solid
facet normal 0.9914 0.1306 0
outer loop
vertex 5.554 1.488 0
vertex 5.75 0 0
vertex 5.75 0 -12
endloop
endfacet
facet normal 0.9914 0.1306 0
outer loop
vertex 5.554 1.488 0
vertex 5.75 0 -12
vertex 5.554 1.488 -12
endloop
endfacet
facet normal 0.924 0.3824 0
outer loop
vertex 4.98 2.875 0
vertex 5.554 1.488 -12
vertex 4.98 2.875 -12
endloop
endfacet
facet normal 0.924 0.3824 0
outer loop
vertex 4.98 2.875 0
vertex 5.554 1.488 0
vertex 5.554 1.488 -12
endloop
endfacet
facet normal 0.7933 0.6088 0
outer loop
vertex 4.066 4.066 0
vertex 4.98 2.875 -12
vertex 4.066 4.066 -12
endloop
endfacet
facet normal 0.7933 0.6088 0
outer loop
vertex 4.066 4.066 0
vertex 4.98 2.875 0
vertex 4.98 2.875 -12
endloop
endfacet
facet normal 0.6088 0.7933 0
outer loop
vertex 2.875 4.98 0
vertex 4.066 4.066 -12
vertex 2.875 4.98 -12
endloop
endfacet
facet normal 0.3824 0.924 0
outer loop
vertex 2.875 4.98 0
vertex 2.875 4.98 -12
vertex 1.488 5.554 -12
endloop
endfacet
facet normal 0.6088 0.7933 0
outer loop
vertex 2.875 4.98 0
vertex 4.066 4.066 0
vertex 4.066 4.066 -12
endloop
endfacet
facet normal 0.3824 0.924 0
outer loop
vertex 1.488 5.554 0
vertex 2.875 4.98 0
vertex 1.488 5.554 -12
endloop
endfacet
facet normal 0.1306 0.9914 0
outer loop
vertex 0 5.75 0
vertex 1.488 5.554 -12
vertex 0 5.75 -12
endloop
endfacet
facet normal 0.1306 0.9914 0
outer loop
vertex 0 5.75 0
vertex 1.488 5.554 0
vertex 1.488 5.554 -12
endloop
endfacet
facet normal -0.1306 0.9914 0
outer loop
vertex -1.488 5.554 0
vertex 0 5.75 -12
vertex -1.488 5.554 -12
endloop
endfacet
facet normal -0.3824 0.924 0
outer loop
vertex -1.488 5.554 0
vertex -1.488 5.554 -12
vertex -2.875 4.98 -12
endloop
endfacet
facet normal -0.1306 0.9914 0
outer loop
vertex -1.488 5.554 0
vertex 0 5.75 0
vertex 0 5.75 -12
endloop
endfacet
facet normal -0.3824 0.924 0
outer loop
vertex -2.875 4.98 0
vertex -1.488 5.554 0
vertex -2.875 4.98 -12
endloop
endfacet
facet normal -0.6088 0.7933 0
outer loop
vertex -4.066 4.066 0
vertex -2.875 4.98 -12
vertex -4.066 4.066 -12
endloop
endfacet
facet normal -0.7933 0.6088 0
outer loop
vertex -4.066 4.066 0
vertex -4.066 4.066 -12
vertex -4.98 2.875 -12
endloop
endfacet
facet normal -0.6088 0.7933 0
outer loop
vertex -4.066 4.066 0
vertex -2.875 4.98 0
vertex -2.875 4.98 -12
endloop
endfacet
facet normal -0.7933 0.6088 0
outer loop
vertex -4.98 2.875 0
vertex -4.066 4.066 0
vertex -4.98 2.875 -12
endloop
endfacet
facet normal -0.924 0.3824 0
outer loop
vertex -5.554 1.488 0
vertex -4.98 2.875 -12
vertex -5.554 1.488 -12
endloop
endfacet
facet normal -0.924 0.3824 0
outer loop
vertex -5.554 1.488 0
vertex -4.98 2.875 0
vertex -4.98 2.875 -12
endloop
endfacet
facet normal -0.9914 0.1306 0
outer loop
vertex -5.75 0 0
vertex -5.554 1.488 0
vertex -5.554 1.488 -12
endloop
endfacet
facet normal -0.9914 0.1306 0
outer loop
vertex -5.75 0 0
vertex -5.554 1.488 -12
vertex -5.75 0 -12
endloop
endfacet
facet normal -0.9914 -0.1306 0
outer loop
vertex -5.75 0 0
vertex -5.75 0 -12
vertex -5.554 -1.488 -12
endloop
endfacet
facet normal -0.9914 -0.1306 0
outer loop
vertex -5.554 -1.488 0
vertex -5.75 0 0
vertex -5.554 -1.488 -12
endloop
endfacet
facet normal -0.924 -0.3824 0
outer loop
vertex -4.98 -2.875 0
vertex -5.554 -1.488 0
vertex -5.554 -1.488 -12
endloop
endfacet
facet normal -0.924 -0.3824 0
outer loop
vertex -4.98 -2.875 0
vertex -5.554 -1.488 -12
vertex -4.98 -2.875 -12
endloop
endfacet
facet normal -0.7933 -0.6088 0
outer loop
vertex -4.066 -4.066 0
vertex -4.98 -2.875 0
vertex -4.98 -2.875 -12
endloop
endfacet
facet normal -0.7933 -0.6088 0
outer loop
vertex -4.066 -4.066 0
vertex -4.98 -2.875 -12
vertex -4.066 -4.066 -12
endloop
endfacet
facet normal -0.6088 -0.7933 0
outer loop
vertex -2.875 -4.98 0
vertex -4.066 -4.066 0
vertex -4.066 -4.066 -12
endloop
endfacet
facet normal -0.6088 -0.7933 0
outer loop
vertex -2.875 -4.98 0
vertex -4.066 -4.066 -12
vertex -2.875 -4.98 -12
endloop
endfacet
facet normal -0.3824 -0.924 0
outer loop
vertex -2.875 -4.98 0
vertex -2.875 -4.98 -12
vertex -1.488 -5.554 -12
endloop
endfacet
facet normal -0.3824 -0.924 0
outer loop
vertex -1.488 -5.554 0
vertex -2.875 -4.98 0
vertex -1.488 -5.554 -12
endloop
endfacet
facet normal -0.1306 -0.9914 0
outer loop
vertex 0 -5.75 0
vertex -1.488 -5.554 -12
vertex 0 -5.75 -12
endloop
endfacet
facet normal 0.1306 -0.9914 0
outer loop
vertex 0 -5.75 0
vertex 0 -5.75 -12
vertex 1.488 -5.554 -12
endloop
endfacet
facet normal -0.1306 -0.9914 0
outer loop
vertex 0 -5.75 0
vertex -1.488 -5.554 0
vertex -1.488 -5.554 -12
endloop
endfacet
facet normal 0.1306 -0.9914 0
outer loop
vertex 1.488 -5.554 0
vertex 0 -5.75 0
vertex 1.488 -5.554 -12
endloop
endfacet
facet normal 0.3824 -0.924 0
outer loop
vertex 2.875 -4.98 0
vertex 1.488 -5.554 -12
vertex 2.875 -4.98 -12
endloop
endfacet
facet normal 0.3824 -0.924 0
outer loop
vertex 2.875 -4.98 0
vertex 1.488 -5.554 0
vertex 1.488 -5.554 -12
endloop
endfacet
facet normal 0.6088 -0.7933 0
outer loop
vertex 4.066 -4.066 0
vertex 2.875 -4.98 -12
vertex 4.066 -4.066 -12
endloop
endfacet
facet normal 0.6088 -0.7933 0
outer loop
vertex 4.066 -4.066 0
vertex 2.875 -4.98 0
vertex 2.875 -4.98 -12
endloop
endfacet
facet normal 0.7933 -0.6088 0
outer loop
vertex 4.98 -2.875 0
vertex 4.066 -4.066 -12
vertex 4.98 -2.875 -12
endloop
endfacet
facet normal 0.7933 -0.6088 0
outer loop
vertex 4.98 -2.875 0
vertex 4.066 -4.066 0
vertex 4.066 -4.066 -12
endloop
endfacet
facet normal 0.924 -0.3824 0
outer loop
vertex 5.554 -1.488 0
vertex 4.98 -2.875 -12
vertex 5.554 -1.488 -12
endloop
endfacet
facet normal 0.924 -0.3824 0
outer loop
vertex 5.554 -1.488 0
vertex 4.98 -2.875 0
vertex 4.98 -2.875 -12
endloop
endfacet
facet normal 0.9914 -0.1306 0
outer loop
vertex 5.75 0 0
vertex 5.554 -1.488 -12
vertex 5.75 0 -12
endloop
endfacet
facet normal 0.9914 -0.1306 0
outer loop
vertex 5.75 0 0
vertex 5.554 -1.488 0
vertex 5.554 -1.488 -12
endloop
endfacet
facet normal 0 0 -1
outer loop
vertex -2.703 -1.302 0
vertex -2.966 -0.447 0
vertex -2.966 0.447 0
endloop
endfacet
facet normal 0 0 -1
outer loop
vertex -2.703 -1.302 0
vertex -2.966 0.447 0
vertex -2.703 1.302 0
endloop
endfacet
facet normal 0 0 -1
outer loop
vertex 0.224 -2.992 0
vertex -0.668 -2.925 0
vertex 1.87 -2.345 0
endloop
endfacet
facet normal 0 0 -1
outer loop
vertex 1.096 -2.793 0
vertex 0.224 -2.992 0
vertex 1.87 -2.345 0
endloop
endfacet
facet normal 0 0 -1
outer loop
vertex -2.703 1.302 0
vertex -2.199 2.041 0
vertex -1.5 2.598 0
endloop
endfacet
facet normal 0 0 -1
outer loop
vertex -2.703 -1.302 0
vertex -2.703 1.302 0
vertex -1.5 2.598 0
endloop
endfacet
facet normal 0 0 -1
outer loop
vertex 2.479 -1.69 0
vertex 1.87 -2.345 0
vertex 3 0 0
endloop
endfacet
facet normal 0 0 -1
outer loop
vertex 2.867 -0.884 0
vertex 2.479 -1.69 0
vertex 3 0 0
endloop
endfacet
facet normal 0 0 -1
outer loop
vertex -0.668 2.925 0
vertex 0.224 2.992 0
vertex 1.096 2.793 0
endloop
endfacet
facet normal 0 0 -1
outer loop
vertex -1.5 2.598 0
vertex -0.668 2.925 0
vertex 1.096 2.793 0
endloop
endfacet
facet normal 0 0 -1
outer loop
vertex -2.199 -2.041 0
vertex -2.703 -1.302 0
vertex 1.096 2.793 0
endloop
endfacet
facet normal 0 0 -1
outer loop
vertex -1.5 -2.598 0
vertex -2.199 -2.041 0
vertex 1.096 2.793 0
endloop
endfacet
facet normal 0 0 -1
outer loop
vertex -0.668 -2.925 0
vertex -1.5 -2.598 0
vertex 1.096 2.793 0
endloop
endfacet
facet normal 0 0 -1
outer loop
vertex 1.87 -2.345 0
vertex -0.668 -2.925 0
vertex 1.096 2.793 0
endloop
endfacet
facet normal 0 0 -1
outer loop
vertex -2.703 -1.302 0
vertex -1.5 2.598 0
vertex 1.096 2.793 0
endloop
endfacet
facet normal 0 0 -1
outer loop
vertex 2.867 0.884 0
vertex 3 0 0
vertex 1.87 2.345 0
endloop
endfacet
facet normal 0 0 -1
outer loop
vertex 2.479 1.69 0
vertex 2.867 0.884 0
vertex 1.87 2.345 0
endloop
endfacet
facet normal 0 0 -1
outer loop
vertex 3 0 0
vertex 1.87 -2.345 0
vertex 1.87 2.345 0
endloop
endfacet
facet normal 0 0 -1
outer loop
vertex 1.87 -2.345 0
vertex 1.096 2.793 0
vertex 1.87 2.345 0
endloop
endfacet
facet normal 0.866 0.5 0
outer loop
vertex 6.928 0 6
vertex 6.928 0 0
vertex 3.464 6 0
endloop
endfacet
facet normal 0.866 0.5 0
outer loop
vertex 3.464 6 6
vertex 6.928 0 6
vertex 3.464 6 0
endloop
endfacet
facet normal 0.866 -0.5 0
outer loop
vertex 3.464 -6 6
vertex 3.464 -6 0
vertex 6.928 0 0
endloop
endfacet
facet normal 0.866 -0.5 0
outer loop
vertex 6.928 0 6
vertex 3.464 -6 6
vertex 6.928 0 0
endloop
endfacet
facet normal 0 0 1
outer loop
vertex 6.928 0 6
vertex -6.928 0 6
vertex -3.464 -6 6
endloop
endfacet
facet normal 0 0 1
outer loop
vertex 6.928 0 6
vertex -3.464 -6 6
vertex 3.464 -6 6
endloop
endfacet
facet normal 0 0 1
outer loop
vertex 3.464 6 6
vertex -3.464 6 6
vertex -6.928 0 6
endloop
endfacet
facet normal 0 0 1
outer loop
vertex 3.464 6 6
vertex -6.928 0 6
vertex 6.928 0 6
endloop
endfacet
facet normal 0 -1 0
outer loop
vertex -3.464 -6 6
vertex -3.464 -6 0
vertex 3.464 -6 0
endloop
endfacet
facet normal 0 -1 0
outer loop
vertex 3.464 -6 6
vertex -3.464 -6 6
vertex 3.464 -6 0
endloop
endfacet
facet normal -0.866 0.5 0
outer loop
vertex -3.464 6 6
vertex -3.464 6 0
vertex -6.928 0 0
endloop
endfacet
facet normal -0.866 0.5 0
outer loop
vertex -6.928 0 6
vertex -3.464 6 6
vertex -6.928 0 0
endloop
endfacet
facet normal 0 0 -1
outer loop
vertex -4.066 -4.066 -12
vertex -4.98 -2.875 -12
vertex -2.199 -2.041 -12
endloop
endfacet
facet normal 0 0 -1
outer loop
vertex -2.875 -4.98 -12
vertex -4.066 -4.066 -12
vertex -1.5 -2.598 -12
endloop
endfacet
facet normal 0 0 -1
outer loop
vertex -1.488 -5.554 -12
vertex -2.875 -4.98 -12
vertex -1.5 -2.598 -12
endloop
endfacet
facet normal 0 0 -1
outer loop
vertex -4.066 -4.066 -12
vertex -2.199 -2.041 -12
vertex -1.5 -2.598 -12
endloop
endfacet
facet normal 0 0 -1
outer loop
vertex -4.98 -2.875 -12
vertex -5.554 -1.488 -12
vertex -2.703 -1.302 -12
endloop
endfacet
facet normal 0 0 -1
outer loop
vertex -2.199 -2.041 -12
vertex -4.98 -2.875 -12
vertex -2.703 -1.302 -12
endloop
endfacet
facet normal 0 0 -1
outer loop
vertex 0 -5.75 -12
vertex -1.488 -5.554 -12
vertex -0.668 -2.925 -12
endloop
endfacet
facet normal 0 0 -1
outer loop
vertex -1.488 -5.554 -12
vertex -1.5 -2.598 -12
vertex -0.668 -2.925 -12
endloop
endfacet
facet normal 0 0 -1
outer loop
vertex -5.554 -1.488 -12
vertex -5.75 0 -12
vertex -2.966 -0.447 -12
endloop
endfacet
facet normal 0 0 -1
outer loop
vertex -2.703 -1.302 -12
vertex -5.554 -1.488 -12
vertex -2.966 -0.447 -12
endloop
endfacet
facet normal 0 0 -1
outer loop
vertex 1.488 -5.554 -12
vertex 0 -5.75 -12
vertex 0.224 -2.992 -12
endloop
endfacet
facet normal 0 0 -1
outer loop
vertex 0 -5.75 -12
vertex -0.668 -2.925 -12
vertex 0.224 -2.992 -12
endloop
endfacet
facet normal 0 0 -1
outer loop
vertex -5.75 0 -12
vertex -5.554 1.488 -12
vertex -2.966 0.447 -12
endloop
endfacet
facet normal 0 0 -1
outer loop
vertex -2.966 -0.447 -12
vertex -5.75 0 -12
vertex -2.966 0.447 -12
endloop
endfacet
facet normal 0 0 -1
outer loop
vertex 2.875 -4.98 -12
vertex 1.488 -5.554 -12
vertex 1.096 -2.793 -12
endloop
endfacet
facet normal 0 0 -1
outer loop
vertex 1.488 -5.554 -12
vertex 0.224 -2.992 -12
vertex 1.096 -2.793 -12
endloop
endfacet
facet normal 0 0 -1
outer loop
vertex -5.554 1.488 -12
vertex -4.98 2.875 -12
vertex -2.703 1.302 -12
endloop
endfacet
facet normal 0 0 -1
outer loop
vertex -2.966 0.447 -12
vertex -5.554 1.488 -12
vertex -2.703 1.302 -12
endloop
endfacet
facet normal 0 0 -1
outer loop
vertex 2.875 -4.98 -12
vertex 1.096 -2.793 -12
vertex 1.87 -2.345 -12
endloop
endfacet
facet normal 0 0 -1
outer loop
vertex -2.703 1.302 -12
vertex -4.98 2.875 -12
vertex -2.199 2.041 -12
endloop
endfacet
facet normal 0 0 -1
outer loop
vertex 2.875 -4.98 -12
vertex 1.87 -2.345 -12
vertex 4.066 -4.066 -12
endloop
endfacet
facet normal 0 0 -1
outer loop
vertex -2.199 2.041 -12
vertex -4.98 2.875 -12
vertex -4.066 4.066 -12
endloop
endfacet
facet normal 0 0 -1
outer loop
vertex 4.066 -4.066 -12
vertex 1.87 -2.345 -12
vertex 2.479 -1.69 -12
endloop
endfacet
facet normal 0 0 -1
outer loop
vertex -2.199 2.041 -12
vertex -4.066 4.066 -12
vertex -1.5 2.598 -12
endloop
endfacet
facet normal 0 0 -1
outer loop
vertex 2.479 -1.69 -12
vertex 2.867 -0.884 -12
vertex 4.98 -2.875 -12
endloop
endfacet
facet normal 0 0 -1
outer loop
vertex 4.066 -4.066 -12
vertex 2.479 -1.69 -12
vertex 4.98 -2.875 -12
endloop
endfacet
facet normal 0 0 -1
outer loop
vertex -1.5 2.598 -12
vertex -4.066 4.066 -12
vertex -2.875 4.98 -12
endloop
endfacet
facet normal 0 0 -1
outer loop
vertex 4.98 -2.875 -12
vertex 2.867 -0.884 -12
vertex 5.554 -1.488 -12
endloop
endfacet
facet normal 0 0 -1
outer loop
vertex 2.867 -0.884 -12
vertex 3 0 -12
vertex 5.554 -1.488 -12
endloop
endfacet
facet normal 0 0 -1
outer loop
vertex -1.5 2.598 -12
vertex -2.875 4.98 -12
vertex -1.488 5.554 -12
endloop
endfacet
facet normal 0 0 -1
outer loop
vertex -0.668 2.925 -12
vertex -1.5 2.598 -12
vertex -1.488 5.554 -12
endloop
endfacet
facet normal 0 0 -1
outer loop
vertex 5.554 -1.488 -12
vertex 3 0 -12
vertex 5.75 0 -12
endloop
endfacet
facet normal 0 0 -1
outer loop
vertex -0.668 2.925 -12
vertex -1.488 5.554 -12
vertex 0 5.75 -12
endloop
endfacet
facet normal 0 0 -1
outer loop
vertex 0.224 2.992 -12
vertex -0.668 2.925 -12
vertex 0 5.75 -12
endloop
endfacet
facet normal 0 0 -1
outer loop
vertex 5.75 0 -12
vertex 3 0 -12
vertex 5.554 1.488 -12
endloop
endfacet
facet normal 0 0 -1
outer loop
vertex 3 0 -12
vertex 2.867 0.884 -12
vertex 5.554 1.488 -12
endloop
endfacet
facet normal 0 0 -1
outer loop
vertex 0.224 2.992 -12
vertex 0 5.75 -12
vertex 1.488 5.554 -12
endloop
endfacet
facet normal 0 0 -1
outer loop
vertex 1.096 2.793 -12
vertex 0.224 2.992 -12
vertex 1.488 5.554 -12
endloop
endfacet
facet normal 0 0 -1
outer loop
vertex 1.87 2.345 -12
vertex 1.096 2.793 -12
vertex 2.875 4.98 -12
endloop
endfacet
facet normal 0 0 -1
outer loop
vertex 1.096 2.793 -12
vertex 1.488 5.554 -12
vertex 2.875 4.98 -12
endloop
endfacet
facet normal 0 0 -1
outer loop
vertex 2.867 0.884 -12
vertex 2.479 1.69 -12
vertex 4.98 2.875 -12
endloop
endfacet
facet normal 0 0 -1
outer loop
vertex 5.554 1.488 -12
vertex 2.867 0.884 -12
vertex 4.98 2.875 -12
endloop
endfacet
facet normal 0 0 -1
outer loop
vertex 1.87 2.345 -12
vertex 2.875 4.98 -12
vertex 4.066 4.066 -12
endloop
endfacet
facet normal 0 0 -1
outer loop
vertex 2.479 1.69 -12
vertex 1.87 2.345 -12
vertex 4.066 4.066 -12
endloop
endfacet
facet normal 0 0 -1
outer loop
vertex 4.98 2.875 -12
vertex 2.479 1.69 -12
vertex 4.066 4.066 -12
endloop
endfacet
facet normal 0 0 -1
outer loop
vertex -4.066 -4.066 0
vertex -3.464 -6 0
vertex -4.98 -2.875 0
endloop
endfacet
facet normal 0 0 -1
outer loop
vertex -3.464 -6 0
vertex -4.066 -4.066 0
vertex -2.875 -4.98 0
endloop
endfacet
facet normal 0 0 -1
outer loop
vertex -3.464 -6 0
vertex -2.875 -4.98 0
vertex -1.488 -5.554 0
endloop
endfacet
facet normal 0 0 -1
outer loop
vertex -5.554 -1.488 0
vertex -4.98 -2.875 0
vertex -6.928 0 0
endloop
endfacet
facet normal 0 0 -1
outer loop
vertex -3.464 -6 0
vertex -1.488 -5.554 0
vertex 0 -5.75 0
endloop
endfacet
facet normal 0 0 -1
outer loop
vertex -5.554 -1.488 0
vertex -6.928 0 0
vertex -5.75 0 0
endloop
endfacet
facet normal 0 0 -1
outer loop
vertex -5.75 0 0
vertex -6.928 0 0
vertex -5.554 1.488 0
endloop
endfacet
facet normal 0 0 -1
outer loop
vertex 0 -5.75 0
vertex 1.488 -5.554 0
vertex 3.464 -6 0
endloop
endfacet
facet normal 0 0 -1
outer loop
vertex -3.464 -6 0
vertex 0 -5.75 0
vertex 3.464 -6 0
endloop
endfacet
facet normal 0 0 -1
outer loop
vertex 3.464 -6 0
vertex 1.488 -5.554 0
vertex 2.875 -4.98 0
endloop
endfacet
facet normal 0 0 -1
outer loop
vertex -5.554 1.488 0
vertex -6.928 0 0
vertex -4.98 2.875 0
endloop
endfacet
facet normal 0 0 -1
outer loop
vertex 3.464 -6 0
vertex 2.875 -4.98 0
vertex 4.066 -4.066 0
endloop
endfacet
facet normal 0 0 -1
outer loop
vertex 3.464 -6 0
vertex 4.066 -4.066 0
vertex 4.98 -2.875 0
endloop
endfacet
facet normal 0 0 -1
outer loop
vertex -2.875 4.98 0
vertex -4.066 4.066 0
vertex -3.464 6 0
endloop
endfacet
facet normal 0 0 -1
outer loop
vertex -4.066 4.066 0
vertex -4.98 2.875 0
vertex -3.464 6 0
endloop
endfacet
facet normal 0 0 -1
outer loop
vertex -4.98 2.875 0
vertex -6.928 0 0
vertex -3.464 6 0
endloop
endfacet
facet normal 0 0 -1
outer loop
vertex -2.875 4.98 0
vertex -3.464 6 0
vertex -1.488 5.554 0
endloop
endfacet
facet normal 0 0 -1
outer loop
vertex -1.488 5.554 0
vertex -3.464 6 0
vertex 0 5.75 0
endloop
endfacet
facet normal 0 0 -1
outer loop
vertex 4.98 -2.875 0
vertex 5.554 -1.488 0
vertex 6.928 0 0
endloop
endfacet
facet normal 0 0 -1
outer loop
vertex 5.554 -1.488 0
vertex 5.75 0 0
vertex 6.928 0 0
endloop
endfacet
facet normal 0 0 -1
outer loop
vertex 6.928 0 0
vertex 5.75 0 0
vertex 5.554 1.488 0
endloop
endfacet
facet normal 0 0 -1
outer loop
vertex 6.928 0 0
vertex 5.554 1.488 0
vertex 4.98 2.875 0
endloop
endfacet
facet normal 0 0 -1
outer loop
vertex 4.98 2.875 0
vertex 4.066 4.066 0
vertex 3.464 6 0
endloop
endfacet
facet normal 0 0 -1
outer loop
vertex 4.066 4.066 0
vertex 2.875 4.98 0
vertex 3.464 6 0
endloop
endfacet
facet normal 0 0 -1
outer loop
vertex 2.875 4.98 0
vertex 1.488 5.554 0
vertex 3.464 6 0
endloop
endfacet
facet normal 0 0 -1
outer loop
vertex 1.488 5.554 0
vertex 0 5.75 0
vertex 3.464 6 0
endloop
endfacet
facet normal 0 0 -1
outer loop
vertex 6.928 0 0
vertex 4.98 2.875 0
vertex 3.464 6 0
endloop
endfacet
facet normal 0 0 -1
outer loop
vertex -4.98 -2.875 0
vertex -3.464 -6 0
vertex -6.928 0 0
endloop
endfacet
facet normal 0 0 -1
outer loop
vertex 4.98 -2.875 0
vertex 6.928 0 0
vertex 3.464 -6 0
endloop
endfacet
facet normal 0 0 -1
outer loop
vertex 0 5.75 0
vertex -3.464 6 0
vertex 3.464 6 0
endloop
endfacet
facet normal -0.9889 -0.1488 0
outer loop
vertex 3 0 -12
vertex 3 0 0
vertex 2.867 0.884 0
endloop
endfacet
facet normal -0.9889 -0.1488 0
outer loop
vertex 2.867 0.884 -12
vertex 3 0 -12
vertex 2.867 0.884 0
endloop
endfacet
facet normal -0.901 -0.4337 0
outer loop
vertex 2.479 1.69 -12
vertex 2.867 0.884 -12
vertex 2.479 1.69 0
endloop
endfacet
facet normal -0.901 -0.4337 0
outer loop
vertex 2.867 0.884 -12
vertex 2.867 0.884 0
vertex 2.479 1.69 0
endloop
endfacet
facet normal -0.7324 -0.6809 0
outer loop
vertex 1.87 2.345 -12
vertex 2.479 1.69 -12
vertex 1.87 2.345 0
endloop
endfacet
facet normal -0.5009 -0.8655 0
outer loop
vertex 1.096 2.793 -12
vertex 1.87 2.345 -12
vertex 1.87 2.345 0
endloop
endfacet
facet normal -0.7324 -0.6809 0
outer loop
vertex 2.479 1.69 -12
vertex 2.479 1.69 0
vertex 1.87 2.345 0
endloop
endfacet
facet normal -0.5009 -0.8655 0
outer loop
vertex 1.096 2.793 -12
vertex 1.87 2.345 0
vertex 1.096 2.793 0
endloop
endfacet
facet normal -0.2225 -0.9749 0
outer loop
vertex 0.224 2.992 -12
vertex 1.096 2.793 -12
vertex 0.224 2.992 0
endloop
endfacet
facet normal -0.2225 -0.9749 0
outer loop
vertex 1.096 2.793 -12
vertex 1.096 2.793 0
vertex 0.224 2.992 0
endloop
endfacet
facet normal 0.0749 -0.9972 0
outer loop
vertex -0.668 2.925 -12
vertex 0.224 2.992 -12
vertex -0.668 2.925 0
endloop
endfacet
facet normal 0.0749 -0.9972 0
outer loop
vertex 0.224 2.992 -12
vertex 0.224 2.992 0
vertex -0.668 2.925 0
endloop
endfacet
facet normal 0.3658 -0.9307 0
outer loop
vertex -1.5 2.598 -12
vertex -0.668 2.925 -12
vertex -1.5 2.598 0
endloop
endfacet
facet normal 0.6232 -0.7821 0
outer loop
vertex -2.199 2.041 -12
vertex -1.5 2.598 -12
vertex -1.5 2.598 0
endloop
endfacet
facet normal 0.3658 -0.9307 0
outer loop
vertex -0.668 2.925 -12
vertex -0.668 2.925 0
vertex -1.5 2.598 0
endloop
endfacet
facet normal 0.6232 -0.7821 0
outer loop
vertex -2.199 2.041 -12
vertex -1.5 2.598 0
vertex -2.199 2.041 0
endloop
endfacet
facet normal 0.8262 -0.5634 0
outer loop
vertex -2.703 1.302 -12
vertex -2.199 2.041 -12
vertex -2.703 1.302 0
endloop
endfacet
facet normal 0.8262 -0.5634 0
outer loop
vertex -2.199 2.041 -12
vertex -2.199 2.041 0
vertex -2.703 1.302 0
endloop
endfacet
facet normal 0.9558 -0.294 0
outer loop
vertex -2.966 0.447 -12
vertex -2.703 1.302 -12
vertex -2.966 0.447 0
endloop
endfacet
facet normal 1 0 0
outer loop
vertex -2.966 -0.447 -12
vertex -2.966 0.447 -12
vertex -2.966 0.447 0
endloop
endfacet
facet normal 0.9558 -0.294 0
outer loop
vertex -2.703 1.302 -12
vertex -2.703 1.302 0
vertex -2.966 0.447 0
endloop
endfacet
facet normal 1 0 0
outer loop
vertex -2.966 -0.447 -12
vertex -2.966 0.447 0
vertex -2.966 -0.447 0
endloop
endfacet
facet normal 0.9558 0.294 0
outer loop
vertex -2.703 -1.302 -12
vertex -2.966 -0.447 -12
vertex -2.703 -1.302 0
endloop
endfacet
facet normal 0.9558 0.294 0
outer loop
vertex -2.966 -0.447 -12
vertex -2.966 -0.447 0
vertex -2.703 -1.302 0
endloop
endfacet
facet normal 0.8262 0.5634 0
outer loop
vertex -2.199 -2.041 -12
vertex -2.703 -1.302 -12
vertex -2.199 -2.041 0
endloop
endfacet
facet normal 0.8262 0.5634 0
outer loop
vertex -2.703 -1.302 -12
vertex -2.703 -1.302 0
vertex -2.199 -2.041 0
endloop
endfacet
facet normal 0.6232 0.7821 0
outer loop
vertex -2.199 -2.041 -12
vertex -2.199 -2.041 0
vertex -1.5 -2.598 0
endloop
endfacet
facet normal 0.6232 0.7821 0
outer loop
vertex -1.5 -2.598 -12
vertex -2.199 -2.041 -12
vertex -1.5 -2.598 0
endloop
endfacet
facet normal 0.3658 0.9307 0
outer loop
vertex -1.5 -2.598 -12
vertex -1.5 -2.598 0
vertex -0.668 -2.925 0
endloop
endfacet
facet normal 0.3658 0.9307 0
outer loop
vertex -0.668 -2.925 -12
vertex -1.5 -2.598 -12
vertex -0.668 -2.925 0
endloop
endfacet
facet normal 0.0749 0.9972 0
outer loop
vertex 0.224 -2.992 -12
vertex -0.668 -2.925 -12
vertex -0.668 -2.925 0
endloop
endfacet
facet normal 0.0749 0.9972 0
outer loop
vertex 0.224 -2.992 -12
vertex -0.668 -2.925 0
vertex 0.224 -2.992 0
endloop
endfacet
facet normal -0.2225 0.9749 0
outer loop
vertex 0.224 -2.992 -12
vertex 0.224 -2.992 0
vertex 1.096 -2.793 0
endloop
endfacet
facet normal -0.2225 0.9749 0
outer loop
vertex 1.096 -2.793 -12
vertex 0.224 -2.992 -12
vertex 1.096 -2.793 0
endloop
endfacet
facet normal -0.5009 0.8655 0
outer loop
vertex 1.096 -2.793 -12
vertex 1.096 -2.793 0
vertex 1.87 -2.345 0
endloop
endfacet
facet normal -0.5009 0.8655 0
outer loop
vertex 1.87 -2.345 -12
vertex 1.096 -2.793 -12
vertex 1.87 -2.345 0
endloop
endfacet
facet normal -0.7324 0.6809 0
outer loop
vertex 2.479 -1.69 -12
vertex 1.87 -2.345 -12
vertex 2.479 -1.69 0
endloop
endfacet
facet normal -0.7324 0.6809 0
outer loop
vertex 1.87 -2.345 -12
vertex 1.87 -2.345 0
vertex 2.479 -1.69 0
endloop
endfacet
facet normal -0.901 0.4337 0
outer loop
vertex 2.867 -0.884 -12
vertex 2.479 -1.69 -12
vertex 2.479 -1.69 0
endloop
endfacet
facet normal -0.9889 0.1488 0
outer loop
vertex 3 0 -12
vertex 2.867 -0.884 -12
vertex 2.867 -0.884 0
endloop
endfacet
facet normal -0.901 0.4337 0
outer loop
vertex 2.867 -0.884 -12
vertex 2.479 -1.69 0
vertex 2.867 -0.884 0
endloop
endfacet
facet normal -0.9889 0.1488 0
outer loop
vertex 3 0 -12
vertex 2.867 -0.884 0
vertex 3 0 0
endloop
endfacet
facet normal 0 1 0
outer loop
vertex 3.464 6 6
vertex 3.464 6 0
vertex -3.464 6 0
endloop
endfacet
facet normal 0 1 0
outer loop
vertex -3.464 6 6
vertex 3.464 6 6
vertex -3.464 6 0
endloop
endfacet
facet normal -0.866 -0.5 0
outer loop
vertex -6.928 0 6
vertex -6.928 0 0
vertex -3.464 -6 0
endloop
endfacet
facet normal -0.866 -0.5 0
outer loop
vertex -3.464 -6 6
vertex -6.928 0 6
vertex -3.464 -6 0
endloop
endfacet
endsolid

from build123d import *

# Parameters (mm, degrees)
BOSS_EXTRUDE1_DEPTH = 6
SKETCH1_3_R         = 5.75
SKETCH1_3_R_2       = 3
BOSS_EXTRUDE2_DEPTH = 12


with BuildPart() as part:
    # Sketch1 → Boss-Extrude1 (new body)
    with BuildSketch(Plane.XY):
        Polygon((-6.92820323, 0), (-3.464101615, -6), (3.464101615, -6), (6.92820323, 0), (3.464101615, 6), (-3.464101615, 6), align=None)
    extrude(amount=BOSS_EXTRUDE1_DEPTH)

    # Sketch1<3> → Boss-Extrude2 (add)
    with BuildSketch(Plane.XY):
        Circle(SKETCH1_3_R)
        Circle(SKETCH1_3_R_2, mode=Mode.SUBTRACT)
    extrude(amount=-BOSS_EXTRUDE2_DEPTH)


solid = part.part
